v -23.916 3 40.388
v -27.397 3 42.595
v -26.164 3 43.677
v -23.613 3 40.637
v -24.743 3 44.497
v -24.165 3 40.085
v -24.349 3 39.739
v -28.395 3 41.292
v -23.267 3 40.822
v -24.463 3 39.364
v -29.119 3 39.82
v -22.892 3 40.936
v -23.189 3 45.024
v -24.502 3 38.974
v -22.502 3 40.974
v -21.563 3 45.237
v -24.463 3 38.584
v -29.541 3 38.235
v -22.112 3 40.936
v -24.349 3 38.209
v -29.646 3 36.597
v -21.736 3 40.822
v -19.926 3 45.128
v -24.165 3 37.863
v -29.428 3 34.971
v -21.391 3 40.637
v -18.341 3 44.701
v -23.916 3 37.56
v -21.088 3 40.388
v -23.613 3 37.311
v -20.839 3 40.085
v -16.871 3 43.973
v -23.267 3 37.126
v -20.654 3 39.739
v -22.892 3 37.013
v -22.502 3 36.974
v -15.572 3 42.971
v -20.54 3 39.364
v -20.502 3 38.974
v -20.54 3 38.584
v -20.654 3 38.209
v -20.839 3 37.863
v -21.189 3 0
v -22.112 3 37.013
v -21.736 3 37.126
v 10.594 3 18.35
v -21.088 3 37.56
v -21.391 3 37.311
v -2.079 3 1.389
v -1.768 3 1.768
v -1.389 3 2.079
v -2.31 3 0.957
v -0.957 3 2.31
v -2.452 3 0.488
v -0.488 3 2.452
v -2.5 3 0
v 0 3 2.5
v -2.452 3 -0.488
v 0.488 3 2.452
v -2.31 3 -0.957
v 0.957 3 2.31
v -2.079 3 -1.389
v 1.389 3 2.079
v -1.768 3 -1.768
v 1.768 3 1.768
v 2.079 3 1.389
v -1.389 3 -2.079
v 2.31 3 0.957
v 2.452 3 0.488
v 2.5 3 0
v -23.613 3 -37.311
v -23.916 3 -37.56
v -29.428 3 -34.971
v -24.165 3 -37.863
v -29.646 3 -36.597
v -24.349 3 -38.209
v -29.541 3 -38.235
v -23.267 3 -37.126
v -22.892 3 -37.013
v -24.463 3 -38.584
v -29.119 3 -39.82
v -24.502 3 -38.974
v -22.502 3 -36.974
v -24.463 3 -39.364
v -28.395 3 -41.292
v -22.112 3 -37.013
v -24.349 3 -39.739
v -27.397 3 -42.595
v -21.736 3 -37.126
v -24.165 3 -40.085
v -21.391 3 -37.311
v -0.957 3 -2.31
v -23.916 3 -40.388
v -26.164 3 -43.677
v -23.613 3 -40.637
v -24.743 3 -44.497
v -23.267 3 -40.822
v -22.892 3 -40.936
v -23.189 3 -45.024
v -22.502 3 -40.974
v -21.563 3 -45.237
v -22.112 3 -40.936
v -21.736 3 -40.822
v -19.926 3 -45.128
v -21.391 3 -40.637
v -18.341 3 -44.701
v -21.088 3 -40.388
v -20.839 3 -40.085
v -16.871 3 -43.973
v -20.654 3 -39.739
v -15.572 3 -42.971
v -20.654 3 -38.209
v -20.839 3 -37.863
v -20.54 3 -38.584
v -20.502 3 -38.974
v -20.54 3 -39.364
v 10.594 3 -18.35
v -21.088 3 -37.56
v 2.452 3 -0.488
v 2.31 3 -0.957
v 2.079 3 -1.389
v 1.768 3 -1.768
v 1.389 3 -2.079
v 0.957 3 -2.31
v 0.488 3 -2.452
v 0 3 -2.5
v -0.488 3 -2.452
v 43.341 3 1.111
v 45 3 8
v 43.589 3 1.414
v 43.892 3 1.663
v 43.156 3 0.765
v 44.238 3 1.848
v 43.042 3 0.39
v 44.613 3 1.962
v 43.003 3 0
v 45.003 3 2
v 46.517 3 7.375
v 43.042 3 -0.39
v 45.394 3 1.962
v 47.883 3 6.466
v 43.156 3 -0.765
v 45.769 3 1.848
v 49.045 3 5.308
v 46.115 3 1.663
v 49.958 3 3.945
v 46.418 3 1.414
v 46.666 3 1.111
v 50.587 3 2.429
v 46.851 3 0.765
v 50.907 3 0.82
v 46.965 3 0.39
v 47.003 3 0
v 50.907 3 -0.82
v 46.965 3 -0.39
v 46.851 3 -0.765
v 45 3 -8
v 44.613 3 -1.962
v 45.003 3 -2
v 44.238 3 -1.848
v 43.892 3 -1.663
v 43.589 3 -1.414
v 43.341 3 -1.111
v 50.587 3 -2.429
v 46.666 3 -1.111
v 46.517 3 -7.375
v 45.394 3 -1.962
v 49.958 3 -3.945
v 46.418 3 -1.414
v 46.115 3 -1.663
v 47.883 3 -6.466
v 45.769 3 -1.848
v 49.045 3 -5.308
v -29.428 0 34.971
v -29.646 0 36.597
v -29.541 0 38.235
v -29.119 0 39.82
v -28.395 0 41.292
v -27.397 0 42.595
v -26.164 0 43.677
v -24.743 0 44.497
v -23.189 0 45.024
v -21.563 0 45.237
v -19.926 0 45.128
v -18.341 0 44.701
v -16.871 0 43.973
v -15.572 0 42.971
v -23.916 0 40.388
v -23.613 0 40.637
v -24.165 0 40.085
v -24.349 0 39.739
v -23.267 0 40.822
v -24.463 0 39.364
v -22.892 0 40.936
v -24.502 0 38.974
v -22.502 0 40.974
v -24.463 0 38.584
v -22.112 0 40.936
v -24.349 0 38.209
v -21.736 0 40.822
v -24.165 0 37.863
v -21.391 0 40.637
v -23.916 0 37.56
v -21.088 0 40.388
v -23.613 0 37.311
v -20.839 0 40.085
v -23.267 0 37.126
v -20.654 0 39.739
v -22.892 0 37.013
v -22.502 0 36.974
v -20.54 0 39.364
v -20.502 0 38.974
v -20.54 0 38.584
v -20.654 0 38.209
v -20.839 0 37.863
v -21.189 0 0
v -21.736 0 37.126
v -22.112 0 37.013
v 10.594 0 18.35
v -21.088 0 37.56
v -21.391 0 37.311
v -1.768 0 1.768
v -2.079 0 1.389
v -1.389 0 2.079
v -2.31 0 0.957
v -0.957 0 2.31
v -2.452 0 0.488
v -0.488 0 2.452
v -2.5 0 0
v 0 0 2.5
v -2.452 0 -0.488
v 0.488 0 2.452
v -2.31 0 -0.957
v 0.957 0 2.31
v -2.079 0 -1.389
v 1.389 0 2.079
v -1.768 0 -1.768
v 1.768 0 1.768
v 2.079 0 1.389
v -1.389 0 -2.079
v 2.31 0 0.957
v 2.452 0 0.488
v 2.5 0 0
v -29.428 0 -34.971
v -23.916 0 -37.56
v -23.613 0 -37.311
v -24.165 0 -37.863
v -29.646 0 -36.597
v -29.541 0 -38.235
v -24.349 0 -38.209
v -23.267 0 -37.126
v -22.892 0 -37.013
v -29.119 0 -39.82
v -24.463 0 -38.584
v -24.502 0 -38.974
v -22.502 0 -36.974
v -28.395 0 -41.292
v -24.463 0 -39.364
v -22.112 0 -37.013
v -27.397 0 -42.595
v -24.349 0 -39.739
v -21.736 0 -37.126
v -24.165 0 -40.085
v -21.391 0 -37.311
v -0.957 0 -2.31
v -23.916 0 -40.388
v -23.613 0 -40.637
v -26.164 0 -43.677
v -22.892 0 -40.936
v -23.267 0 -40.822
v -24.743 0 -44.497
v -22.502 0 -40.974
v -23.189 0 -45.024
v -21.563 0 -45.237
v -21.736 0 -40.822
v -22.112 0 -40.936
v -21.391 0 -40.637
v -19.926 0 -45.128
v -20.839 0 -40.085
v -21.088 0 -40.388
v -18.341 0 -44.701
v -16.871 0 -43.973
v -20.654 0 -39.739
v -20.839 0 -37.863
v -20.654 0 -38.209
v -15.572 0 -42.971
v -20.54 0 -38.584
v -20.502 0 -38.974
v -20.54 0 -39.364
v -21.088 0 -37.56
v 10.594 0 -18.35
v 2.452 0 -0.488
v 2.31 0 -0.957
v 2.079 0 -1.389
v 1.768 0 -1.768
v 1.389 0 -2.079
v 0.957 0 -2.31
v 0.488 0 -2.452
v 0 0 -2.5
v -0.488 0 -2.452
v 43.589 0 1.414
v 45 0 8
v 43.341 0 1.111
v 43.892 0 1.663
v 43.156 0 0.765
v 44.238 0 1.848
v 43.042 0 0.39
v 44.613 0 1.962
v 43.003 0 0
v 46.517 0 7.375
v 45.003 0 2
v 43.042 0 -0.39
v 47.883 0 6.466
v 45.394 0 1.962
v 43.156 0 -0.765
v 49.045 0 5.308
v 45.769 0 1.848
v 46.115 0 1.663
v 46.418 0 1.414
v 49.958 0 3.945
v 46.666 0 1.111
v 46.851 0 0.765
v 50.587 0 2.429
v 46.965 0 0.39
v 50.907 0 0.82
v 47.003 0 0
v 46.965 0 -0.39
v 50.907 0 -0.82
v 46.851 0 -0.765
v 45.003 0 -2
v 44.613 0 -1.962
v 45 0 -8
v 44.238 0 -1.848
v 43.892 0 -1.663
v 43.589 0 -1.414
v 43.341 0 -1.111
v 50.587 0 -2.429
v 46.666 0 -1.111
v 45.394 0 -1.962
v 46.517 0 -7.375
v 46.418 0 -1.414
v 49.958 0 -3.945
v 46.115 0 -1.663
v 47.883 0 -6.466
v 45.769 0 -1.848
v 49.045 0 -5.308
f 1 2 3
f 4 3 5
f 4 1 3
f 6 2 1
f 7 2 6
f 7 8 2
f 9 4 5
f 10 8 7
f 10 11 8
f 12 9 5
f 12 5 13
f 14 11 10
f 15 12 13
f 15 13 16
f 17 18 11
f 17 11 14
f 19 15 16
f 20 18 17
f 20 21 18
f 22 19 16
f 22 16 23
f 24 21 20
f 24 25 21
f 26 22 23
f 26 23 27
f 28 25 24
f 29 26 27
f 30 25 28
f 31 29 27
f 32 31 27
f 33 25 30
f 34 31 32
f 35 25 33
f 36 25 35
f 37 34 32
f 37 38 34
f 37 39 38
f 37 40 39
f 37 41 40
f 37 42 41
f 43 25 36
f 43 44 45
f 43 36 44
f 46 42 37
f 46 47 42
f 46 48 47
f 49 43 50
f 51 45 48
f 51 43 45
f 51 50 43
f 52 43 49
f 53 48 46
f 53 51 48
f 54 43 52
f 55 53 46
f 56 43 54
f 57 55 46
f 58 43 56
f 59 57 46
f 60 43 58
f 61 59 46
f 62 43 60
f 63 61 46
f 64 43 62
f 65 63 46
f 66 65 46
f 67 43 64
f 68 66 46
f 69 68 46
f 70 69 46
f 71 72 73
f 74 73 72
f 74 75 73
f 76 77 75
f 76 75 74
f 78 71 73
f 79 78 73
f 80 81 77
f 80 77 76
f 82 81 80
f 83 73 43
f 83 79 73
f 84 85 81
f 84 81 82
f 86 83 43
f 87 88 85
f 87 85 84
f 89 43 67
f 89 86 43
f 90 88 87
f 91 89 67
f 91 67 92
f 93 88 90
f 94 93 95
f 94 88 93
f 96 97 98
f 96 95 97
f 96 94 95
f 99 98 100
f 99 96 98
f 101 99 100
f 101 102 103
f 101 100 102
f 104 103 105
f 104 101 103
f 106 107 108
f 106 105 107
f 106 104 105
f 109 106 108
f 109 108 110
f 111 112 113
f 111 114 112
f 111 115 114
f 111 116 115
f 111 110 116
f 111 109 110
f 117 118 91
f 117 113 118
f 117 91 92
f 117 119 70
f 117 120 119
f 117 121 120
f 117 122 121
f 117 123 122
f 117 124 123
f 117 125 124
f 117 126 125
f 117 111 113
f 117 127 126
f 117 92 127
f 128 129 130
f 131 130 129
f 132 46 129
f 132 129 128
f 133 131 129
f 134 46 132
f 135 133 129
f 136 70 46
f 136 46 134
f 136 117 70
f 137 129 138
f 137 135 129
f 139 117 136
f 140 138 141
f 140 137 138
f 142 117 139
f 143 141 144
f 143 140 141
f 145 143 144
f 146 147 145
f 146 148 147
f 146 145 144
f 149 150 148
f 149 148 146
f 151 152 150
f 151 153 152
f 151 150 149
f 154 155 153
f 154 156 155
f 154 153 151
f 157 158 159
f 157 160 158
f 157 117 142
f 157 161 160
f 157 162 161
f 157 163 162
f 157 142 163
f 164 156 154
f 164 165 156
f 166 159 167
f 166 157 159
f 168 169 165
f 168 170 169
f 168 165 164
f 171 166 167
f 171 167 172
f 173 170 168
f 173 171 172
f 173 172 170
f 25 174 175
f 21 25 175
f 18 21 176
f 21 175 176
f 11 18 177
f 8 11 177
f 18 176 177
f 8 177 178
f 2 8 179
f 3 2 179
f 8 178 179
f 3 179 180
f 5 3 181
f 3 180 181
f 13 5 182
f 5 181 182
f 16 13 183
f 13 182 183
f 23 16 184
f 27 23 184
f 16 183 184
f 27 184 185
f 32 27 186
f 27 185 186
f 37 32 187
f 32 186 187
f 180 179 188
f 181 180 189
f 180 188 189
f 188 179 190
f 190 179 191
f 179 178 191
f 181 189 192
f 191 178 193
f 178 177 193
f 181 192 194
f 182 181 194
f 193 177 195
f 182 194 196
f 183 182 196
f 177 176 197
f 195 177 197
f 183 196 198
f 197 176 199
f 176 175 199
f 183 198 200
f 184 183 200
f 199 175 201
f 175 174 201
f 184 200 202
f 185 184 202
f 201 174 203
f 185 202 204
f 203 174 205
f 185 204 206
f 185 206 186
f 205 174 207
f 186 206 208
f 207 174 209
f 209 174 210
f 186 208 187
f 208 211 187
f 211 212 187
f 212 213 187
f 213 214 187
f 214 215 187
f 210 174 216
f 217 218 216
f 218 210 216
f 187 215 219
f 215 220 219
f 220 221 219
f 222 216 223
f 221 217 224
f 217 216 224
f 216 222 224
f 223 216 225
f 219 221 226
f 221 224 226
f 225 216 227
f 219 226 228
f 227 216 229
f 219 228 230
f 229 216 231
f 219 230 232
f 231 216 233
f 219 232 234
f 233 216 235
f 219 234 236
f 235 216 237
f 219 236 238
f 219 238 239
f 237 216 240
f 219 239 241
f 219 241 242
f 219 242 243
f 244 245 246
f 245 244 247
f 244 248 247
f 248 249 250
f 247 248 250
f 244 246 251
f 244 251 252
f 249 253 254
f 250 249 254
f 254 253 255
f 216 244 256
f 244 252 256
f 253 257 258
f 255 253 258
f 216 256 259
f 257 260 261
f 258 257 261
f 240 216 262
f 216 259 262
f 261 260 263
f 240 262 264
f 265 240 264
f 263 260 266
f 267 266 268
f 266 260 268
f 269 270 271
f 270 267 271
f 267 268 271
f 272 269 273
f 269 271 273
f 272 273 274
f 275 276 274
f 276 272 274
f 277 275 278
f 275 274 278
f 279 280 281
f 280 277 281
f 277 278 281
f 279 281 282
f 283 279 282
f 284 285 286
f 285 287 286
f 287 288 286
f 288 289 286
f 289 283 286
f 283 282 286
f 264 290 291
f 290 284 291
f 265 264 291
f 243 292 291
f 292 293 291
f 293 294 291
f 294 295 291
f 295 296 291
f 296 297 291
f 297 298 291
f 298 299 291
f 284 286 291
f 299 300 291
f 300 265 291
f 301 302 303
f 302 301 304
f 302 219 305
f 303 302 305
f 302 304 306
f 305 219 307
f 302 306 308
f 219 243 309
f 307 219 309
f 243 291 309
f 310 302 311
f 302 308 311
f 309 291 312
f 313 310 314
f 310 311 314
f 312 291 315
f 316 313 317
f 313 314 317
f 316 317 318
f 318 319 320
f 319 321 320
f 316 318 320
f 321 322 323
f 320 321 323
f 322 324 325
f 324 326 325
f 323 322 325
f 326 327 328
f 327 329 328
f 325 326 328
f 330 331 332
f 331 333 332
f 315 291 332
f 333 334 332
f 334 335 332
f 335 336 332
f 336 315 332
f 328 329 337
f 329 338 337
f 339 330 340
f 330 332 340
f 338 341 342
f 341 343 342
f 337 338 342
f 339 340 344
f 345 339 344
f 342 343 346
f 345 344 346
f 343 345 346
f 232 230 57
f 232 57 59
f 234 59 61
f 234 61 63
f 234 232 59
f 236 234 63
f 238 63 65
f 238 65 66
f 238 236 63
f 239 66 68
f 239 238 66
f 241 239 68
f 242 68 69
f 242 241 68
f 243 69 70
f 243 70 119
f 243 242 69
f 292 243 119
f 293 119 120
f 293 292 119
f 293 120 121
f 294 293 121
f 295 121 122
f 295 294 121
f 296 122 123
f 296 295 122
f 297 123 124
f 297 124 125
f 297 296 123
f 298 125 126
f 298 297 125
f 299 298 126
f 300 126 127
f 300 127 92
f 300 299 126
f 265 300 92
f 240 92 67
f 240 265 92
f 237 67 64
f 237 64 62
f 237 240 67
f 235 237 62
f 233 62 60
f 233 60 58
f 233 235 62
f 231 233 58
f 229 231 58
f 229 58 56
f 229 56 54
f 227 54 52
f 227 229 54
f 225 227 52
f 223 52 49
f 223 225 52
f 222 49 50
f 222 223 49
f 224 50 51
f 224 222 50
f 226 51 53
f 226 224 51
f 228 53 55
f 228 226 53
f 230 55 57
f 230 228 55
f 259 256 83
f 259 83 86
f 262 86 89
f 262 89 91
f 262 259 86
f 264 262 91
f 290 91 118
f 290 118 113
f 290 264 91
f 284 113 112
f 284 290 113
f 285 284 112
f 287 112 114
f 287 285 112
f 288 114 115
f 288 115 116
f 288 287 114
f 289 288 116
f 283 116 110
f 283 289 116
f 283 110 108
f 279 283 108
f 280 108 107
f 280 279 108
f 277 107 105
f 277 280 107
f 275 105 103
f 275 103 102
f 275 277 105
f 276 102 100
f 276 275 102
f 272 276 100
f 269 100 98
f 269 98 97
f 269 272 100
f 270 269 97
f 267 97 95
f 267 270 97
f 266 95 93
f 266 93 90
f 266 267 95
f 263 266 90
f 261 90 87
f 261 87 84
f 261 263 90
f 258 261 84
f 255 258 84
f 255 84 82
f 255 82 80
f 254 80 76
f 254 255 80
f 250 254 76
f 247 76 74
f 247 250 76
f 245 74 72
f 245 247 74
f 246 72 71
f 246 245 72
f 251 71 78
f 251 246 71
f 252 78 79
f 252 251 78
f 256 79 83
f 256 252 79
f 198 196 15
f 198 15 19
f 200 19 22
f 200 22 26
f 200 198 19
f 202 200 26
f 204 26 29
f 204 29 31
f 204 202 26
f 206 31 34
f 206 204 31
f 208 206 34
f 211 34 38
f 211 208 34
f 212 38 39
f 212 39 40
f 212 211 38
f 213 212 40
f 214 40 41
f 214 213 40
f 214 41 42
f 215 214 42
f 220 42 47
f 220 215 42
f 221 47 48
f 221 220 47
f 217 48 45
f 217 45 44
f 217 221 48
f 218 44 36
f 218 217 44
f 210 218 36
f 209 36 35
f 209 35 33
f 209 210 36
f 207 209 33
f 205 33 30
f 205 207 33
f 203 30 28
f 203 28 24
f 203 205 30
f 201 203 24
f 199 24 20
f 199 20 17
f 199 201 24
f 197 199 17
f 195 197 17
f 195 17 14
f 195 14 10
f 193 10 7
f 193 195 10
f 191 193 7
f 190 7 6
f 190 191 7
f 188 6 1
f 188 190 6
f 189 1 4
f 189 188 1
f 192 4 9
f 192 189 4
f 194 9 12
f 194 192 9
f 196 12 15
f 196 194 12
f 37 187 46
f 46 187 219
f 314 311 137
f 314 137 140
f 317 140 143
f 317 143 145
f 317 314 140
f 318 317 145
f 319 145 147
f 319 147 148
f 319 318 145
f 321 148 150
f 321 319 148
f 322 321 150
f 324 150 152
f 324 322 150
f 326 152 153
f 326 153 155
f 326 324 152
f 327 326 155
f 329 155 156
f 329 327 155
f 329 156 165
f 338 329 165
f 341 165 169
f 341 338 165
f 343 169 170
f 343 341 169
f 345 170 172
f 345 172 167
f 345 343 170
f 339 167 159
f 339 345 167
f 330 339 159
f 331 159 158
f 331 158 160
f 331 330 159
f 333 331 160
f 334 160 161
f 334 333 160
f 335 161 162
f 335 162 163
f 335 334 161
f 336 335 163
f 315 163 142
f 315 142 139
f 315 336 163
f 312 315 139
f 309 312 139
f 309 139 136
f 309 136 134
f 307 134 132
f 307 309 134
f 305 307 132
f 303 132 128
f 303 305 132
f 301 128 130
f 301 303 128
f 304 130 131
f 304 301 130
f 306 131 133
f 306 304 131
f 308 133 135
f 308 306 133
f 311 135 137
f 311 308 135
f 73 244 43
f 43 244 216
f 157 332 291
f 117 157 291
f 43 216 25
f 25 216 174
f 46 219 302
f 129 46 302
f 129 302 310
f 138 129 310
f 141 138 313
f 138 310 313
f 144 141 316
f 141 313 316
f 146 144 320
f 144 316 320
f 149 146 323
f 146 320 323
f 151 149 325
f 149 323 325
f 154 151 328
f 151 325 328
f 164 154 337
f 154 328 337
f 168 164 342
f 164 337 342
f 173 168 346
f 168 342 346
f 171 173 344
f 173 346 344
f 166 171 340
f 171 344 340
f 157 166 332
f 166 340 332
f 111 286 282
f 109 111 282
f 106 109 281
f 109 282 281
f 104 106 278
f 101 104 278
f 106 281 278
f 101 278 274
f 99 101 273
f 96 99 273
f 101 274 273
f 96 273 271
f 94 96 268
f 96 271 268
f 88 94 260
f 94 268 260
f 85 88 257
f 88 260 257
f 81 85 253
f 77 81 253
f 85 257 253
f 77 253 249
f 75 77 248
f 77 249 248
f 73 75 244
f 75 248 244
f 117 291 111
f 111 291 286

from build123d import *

# Parameters (mm, degrees)
SKETCH2_R           = 2.5
SKETCH2_R_2         = 2
BOSS_EXTRUDE2_DEPTH = 3


with BuildPart() as part:
    # Sketch2 → Boss-Extrude2 (new body)
    with BuildSketch(Plane(origin=(0, 0, 0), x_dir=(1, 0, 0), z_dir=(0, 1, 0))):
        with BuildLine():
            Line((10.594452967, -18.350130817), (45, -8))
            ThreePointArc((45, -8), (50.947530499, 0), (45, 8))
            Line((45, 8), (10.594452967, 18.350130817))
            Line((10.594452967, 18.350130817), (-15.57179677, 42.97114317))
            ThreePointArc((-15.57179677, 42.97114317), (-25.473765249, 44.121855672), (-29.42820323, 34.97114317))
            Line((-29.42820323, 34.97114317), (-21.188905934, 0))
            Line((-21.188905934, 0), (-29.42820323, -34.97114317))
            ThreePointArc((-29.42820323, -34.97114317), (-25.473765249, -44.121855672), (-15.57179677, -42.97114317))
            Line((-15.57179677, -42.97114317), (10.594452967, -18.350130817))
        make_face()
        with Locations(Location((0, 0, 0), (0, 0, 270))):
            Circle(SKETCH2_R, mode=Mode.SUBTRACT)
        with Locations(Location((-22.50172491, 38.974130802, 0), (0, 0, 270))):
            Circle(SKETCH2_R_2, mode=Mode.SUBTRACT)
        with Locations(Location((45.00344982, 0, 0), (0, 0, 270))):
            Circle(SKETCH2_R_2, mode=Mode.SUBTRACT)
        with Locations(Location((-22.50172491, -38.974130802, 0), (0, 0, 270))):
            Circle(SKETCH2_R_2, mode=Mode.SUBTRACT)
    extrude(amount=BOSS_EXTRUDE2_DEPTH)


solid = part.part
